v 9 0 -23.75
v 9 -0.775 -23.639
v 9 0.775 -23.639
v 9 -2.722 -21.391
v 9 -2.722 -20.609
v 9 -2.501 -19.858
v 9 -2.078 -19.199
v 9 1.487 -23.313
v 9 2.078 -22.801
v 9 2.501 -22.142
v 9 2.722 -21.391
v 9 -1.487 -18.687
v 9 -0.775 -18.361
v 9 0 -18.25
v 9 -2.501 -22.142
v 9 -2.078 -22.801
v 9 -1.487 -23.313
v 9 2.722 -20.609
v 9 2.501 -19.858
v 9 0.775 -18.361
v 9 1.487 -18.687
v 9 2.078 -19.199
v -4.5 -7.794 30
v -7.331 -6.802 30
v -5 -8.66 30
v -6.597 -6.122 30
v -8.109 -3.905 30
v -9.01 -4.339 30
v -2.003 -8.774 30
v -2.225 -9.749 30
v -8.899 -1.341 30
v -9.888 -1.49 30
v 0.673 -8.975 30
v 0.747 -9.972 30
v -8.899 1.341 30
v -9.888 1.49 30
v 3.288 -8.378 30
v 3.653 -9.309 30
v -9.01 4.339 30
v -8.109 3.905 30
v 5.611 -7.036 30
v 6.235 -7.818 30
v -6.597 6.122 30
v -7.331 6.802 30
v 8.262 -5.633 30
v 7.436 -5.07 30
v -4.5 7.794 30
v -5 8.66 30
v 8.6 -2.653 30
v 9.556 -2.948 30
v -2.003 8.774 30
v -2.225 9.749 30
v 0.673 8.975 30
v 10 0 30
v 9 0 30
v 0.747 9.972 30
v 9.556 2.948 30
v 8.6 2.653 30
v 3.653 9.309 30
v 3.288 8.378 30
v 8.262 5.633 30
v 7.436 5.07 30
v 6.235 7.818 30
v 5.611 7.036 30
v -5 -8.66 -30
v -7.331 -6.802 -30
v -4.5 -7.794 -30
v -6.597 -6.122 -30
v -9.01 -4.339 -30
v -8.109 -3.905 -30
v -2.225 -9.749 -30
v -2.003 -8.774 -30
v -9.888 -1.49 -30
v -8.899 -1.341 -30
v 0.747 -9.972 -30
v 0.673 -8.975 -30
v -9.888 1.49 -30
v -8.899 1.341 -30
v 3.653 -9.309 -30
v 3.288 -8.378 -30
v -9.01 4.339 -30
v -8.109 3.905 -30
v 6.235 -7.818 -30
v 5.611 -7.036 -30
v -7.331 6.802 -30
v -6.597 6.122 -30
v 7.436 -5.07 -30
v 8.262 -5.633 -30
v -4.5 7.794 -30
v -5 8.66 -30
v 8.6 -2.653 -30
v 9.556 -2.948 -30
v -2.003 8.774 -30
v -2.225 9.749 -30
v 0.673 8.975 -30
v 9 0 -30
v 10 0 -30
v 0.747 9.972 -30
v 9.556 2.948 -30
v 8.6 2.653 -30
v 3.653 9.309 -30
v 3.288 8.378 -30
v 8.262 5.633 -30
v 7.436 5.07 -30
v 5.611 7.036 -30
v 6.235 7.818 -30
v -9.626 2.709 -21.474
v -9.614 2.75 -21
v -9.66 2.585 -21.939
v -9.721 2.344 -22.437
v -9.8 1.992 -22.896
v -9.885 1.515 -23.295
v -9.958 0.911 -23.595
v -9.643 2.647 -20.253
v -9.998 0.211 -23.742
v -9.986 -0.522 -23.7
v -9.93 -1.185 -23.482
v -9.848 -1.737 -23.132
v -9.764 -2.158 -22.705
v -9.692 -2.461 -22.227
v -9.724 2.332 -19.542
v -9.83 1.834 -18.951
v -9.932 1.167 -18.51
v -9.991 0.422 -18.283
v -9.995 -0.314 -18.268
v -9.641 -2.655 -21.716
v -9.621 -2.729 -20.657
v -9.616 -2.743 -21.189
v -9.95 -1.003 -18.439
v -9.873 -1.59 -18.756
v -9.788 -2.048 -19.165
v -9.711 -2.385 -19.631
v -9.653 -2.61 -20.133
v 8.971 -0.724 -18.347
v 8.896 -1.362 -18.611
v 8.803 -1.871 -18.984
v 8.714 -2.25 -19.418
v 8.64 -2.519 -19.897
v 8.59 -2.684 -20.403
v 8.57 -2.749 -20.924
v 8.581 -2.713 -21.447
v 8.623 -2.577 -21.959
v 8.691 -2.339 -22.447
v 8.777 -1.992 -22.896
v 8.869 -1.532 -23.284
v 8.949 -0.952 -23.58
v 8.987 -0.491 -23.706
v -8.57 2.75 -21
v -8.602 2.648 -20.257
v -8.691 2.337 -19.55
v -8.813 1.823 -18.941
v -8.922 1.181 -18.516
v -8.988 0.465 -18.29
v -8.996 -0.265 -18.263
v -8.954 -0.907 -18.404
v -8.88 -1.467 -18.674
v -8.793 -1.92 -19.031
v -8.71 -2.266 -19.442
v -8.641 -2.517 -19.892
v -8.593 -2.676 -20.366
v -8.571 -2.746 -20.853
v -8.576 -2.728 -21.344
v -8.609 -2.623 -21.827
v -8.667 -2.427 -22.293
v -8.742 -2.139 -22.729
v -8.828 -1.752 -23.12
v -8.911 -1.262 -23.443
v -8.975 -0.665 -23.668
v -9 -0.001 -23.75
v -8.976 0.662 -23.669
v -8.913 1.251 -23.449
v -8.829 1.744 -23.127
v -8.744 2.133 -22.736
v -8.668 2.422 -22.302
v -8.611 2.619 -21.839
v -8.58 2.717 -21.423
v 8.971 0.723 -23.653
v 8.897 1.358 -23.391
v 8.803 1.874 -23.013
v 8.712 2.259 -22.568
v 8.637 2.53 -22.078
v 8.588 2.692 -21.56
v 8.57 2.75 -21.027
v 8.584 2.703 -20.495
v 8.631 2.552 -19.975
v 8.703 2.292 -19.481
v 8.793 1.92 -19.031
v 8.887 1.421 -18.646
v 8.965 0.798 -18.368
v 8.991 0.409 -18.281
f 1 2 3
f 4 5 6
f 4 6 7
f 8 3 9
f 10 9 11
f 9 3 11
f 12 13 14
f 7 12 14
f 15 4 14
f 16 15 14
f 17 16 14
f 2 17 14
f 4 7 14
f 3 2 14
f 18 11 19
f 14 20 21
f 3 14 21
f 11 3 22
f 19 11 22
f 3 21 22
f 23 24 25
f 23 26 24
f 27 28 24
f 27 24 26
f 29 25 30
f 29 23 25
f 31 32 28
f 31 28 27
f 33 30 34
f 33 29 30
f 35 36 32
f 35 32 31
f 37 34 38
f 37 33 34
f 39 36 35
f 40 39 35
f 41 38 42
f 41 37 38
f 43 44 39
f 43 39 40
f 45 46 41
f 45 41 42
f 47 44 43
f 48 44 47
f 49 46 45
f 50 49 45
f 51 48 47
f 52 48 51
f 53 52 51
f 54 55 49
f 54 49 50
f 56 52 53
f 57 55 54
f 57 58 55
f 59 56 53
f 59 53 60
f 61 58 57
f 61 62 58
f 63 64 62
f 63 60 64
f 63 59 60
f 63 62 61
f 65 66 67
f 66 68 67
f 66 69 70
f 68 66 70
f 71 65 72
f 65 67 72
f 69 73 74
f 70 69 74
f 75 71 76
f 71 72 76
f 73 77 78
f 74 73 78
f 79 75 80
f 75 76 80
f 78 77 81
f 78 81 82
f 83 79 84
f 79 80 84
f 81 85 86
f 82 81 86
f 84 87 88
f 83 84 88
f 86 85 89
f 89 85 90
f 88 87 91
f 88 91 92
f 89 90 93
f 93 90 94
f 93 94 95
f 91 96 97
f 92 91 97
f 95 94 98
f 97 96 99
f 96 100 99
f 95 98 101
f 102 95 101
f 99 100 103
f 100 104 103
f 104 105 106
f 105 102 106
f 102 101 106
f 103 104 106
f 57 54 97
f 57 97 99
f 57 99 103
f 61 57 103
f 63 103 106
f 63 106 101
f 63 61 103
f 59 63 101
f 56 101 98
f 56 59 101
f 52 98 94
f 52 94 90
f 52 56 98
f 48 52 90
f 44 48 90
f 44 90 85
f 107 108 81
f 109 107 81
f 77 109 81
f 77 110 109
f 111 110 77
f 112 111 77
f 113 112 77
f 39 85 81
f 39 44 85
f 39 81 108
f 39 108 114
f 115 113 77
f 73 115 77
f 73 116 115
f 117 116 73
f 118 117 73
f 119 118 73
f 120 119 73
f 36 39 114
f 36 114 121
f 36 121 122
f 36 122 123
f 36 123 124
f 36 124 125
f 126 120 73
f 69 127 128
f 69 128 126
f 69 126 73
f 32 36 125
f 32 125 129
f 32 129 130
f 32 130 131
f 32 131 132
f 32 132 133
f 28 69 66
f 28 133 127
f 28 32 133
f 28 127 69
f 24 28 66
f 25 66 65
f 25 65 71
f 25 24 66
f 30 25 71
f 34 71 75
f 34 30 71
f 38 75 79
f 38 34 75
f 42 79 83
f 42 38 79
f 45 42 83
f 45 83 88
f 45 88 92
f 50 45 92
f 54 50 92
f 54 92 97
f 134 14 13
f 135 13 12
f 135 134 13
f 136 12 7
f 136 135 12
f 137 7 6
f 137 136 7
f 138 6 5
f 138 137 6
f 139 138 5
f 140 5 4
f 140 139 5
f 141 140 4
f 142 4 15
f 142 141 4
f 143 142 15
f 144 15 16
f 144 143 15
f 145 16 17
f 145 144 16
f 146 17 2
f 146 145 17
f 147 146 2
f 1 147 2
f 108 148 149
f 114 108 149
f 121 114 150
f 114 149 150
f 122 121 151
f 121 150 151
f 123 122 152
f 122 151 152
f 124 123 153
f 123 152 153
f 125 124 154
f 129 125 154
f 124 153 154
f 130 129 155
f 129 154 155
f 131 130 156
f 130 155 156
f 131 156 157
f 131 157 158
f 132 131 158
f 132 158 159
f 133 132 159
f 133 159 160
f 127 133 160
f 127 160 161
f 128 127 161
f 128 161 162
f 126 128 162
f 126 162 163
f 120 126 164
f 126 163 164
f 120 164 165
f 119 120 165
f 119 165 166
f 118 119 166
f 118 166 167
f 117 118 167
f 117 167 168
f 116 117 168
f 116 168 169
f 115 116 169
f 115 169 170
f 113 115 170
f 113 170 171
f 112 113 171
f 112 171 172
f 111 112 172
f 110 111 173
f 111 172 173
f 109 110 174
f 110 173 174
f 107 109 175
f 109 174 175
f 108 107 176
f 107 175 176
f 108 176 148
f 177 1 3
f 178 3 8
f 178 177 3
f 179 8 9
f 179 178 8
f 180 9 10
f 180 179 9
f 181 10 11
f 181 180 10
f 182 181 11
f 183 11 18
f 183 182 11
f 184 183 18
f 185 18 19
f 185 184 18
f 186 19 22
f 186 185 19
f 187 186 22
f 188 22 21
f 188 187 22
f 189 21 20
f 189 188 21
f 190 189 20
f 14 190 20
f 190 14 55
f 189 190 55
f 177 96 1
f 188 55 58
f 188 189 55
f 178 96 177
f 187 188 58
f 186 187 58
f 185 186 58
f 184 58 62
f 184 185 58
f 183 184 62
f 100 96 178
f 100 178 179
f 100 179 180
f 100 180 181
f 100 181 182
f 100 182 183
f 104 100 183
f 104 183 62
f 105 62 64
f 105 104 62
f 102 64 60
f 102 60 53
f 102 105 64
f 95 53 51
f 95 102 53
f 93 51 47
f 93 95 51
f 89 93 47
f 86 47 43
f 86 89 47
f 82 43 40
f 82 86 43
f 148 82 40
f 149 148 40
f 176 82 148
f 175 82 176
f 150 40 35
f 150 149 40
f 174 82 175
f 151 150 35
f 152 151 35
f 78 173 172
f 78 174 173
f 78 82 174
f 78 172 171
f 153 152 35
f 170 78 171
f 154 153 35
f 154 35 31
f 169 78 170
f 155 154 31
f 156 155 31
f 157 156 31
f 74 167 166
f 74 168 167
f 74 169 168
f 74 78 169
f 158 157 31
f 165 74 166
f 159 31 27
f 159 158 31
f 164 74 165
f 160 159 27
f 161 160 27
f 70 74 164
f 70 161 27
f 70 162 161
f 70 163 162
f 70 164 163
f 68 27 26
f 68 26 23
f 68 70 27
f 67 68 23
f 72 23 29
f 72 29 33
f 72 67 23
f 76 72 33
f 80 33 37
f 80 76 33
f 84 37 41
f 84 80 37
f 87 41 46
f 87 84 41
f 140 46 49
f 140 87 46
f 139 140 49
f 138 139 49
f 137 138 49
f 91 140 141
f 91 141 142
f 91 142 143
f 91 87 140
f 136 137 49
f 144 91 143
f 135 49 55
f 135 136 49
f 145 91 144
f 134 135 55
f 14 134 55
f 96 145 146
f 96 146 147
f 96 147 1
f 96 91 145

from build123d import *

# Parameters (mm, degrees)
F0_R          = 10
F0_R_2        = 9
F1_DEPTH      = 30
F2_R          = 2.75
F3_DEPTH      = 25
F3_DEPTH_BACK = 9


with BuildPart() as f1:
    # F0 (on Top) → F1 (new body, symmetric)
    with BuildSketch(Plane.XY):
        Circle(F0_R)
        Circle(F0_R_2, mode=Mode.SUBTRACT)
    extrude(amount=F1_DEPTH, both=True)

    # F2 (on Right) → F3 (cut, two sides)
    with BuildSketch(Plane.YZ) as f3_sk:
        with Locations((0, -21)):
            Circle(F2_R)
    extrude(amount=-F3_DEPTH, mode=Mode.SUBTRACT)
    extrude(f3_sk.sketch, amount=F3_DEPTH_BACK, mode=Mode.SUBTRACT)


solid = f1.part
